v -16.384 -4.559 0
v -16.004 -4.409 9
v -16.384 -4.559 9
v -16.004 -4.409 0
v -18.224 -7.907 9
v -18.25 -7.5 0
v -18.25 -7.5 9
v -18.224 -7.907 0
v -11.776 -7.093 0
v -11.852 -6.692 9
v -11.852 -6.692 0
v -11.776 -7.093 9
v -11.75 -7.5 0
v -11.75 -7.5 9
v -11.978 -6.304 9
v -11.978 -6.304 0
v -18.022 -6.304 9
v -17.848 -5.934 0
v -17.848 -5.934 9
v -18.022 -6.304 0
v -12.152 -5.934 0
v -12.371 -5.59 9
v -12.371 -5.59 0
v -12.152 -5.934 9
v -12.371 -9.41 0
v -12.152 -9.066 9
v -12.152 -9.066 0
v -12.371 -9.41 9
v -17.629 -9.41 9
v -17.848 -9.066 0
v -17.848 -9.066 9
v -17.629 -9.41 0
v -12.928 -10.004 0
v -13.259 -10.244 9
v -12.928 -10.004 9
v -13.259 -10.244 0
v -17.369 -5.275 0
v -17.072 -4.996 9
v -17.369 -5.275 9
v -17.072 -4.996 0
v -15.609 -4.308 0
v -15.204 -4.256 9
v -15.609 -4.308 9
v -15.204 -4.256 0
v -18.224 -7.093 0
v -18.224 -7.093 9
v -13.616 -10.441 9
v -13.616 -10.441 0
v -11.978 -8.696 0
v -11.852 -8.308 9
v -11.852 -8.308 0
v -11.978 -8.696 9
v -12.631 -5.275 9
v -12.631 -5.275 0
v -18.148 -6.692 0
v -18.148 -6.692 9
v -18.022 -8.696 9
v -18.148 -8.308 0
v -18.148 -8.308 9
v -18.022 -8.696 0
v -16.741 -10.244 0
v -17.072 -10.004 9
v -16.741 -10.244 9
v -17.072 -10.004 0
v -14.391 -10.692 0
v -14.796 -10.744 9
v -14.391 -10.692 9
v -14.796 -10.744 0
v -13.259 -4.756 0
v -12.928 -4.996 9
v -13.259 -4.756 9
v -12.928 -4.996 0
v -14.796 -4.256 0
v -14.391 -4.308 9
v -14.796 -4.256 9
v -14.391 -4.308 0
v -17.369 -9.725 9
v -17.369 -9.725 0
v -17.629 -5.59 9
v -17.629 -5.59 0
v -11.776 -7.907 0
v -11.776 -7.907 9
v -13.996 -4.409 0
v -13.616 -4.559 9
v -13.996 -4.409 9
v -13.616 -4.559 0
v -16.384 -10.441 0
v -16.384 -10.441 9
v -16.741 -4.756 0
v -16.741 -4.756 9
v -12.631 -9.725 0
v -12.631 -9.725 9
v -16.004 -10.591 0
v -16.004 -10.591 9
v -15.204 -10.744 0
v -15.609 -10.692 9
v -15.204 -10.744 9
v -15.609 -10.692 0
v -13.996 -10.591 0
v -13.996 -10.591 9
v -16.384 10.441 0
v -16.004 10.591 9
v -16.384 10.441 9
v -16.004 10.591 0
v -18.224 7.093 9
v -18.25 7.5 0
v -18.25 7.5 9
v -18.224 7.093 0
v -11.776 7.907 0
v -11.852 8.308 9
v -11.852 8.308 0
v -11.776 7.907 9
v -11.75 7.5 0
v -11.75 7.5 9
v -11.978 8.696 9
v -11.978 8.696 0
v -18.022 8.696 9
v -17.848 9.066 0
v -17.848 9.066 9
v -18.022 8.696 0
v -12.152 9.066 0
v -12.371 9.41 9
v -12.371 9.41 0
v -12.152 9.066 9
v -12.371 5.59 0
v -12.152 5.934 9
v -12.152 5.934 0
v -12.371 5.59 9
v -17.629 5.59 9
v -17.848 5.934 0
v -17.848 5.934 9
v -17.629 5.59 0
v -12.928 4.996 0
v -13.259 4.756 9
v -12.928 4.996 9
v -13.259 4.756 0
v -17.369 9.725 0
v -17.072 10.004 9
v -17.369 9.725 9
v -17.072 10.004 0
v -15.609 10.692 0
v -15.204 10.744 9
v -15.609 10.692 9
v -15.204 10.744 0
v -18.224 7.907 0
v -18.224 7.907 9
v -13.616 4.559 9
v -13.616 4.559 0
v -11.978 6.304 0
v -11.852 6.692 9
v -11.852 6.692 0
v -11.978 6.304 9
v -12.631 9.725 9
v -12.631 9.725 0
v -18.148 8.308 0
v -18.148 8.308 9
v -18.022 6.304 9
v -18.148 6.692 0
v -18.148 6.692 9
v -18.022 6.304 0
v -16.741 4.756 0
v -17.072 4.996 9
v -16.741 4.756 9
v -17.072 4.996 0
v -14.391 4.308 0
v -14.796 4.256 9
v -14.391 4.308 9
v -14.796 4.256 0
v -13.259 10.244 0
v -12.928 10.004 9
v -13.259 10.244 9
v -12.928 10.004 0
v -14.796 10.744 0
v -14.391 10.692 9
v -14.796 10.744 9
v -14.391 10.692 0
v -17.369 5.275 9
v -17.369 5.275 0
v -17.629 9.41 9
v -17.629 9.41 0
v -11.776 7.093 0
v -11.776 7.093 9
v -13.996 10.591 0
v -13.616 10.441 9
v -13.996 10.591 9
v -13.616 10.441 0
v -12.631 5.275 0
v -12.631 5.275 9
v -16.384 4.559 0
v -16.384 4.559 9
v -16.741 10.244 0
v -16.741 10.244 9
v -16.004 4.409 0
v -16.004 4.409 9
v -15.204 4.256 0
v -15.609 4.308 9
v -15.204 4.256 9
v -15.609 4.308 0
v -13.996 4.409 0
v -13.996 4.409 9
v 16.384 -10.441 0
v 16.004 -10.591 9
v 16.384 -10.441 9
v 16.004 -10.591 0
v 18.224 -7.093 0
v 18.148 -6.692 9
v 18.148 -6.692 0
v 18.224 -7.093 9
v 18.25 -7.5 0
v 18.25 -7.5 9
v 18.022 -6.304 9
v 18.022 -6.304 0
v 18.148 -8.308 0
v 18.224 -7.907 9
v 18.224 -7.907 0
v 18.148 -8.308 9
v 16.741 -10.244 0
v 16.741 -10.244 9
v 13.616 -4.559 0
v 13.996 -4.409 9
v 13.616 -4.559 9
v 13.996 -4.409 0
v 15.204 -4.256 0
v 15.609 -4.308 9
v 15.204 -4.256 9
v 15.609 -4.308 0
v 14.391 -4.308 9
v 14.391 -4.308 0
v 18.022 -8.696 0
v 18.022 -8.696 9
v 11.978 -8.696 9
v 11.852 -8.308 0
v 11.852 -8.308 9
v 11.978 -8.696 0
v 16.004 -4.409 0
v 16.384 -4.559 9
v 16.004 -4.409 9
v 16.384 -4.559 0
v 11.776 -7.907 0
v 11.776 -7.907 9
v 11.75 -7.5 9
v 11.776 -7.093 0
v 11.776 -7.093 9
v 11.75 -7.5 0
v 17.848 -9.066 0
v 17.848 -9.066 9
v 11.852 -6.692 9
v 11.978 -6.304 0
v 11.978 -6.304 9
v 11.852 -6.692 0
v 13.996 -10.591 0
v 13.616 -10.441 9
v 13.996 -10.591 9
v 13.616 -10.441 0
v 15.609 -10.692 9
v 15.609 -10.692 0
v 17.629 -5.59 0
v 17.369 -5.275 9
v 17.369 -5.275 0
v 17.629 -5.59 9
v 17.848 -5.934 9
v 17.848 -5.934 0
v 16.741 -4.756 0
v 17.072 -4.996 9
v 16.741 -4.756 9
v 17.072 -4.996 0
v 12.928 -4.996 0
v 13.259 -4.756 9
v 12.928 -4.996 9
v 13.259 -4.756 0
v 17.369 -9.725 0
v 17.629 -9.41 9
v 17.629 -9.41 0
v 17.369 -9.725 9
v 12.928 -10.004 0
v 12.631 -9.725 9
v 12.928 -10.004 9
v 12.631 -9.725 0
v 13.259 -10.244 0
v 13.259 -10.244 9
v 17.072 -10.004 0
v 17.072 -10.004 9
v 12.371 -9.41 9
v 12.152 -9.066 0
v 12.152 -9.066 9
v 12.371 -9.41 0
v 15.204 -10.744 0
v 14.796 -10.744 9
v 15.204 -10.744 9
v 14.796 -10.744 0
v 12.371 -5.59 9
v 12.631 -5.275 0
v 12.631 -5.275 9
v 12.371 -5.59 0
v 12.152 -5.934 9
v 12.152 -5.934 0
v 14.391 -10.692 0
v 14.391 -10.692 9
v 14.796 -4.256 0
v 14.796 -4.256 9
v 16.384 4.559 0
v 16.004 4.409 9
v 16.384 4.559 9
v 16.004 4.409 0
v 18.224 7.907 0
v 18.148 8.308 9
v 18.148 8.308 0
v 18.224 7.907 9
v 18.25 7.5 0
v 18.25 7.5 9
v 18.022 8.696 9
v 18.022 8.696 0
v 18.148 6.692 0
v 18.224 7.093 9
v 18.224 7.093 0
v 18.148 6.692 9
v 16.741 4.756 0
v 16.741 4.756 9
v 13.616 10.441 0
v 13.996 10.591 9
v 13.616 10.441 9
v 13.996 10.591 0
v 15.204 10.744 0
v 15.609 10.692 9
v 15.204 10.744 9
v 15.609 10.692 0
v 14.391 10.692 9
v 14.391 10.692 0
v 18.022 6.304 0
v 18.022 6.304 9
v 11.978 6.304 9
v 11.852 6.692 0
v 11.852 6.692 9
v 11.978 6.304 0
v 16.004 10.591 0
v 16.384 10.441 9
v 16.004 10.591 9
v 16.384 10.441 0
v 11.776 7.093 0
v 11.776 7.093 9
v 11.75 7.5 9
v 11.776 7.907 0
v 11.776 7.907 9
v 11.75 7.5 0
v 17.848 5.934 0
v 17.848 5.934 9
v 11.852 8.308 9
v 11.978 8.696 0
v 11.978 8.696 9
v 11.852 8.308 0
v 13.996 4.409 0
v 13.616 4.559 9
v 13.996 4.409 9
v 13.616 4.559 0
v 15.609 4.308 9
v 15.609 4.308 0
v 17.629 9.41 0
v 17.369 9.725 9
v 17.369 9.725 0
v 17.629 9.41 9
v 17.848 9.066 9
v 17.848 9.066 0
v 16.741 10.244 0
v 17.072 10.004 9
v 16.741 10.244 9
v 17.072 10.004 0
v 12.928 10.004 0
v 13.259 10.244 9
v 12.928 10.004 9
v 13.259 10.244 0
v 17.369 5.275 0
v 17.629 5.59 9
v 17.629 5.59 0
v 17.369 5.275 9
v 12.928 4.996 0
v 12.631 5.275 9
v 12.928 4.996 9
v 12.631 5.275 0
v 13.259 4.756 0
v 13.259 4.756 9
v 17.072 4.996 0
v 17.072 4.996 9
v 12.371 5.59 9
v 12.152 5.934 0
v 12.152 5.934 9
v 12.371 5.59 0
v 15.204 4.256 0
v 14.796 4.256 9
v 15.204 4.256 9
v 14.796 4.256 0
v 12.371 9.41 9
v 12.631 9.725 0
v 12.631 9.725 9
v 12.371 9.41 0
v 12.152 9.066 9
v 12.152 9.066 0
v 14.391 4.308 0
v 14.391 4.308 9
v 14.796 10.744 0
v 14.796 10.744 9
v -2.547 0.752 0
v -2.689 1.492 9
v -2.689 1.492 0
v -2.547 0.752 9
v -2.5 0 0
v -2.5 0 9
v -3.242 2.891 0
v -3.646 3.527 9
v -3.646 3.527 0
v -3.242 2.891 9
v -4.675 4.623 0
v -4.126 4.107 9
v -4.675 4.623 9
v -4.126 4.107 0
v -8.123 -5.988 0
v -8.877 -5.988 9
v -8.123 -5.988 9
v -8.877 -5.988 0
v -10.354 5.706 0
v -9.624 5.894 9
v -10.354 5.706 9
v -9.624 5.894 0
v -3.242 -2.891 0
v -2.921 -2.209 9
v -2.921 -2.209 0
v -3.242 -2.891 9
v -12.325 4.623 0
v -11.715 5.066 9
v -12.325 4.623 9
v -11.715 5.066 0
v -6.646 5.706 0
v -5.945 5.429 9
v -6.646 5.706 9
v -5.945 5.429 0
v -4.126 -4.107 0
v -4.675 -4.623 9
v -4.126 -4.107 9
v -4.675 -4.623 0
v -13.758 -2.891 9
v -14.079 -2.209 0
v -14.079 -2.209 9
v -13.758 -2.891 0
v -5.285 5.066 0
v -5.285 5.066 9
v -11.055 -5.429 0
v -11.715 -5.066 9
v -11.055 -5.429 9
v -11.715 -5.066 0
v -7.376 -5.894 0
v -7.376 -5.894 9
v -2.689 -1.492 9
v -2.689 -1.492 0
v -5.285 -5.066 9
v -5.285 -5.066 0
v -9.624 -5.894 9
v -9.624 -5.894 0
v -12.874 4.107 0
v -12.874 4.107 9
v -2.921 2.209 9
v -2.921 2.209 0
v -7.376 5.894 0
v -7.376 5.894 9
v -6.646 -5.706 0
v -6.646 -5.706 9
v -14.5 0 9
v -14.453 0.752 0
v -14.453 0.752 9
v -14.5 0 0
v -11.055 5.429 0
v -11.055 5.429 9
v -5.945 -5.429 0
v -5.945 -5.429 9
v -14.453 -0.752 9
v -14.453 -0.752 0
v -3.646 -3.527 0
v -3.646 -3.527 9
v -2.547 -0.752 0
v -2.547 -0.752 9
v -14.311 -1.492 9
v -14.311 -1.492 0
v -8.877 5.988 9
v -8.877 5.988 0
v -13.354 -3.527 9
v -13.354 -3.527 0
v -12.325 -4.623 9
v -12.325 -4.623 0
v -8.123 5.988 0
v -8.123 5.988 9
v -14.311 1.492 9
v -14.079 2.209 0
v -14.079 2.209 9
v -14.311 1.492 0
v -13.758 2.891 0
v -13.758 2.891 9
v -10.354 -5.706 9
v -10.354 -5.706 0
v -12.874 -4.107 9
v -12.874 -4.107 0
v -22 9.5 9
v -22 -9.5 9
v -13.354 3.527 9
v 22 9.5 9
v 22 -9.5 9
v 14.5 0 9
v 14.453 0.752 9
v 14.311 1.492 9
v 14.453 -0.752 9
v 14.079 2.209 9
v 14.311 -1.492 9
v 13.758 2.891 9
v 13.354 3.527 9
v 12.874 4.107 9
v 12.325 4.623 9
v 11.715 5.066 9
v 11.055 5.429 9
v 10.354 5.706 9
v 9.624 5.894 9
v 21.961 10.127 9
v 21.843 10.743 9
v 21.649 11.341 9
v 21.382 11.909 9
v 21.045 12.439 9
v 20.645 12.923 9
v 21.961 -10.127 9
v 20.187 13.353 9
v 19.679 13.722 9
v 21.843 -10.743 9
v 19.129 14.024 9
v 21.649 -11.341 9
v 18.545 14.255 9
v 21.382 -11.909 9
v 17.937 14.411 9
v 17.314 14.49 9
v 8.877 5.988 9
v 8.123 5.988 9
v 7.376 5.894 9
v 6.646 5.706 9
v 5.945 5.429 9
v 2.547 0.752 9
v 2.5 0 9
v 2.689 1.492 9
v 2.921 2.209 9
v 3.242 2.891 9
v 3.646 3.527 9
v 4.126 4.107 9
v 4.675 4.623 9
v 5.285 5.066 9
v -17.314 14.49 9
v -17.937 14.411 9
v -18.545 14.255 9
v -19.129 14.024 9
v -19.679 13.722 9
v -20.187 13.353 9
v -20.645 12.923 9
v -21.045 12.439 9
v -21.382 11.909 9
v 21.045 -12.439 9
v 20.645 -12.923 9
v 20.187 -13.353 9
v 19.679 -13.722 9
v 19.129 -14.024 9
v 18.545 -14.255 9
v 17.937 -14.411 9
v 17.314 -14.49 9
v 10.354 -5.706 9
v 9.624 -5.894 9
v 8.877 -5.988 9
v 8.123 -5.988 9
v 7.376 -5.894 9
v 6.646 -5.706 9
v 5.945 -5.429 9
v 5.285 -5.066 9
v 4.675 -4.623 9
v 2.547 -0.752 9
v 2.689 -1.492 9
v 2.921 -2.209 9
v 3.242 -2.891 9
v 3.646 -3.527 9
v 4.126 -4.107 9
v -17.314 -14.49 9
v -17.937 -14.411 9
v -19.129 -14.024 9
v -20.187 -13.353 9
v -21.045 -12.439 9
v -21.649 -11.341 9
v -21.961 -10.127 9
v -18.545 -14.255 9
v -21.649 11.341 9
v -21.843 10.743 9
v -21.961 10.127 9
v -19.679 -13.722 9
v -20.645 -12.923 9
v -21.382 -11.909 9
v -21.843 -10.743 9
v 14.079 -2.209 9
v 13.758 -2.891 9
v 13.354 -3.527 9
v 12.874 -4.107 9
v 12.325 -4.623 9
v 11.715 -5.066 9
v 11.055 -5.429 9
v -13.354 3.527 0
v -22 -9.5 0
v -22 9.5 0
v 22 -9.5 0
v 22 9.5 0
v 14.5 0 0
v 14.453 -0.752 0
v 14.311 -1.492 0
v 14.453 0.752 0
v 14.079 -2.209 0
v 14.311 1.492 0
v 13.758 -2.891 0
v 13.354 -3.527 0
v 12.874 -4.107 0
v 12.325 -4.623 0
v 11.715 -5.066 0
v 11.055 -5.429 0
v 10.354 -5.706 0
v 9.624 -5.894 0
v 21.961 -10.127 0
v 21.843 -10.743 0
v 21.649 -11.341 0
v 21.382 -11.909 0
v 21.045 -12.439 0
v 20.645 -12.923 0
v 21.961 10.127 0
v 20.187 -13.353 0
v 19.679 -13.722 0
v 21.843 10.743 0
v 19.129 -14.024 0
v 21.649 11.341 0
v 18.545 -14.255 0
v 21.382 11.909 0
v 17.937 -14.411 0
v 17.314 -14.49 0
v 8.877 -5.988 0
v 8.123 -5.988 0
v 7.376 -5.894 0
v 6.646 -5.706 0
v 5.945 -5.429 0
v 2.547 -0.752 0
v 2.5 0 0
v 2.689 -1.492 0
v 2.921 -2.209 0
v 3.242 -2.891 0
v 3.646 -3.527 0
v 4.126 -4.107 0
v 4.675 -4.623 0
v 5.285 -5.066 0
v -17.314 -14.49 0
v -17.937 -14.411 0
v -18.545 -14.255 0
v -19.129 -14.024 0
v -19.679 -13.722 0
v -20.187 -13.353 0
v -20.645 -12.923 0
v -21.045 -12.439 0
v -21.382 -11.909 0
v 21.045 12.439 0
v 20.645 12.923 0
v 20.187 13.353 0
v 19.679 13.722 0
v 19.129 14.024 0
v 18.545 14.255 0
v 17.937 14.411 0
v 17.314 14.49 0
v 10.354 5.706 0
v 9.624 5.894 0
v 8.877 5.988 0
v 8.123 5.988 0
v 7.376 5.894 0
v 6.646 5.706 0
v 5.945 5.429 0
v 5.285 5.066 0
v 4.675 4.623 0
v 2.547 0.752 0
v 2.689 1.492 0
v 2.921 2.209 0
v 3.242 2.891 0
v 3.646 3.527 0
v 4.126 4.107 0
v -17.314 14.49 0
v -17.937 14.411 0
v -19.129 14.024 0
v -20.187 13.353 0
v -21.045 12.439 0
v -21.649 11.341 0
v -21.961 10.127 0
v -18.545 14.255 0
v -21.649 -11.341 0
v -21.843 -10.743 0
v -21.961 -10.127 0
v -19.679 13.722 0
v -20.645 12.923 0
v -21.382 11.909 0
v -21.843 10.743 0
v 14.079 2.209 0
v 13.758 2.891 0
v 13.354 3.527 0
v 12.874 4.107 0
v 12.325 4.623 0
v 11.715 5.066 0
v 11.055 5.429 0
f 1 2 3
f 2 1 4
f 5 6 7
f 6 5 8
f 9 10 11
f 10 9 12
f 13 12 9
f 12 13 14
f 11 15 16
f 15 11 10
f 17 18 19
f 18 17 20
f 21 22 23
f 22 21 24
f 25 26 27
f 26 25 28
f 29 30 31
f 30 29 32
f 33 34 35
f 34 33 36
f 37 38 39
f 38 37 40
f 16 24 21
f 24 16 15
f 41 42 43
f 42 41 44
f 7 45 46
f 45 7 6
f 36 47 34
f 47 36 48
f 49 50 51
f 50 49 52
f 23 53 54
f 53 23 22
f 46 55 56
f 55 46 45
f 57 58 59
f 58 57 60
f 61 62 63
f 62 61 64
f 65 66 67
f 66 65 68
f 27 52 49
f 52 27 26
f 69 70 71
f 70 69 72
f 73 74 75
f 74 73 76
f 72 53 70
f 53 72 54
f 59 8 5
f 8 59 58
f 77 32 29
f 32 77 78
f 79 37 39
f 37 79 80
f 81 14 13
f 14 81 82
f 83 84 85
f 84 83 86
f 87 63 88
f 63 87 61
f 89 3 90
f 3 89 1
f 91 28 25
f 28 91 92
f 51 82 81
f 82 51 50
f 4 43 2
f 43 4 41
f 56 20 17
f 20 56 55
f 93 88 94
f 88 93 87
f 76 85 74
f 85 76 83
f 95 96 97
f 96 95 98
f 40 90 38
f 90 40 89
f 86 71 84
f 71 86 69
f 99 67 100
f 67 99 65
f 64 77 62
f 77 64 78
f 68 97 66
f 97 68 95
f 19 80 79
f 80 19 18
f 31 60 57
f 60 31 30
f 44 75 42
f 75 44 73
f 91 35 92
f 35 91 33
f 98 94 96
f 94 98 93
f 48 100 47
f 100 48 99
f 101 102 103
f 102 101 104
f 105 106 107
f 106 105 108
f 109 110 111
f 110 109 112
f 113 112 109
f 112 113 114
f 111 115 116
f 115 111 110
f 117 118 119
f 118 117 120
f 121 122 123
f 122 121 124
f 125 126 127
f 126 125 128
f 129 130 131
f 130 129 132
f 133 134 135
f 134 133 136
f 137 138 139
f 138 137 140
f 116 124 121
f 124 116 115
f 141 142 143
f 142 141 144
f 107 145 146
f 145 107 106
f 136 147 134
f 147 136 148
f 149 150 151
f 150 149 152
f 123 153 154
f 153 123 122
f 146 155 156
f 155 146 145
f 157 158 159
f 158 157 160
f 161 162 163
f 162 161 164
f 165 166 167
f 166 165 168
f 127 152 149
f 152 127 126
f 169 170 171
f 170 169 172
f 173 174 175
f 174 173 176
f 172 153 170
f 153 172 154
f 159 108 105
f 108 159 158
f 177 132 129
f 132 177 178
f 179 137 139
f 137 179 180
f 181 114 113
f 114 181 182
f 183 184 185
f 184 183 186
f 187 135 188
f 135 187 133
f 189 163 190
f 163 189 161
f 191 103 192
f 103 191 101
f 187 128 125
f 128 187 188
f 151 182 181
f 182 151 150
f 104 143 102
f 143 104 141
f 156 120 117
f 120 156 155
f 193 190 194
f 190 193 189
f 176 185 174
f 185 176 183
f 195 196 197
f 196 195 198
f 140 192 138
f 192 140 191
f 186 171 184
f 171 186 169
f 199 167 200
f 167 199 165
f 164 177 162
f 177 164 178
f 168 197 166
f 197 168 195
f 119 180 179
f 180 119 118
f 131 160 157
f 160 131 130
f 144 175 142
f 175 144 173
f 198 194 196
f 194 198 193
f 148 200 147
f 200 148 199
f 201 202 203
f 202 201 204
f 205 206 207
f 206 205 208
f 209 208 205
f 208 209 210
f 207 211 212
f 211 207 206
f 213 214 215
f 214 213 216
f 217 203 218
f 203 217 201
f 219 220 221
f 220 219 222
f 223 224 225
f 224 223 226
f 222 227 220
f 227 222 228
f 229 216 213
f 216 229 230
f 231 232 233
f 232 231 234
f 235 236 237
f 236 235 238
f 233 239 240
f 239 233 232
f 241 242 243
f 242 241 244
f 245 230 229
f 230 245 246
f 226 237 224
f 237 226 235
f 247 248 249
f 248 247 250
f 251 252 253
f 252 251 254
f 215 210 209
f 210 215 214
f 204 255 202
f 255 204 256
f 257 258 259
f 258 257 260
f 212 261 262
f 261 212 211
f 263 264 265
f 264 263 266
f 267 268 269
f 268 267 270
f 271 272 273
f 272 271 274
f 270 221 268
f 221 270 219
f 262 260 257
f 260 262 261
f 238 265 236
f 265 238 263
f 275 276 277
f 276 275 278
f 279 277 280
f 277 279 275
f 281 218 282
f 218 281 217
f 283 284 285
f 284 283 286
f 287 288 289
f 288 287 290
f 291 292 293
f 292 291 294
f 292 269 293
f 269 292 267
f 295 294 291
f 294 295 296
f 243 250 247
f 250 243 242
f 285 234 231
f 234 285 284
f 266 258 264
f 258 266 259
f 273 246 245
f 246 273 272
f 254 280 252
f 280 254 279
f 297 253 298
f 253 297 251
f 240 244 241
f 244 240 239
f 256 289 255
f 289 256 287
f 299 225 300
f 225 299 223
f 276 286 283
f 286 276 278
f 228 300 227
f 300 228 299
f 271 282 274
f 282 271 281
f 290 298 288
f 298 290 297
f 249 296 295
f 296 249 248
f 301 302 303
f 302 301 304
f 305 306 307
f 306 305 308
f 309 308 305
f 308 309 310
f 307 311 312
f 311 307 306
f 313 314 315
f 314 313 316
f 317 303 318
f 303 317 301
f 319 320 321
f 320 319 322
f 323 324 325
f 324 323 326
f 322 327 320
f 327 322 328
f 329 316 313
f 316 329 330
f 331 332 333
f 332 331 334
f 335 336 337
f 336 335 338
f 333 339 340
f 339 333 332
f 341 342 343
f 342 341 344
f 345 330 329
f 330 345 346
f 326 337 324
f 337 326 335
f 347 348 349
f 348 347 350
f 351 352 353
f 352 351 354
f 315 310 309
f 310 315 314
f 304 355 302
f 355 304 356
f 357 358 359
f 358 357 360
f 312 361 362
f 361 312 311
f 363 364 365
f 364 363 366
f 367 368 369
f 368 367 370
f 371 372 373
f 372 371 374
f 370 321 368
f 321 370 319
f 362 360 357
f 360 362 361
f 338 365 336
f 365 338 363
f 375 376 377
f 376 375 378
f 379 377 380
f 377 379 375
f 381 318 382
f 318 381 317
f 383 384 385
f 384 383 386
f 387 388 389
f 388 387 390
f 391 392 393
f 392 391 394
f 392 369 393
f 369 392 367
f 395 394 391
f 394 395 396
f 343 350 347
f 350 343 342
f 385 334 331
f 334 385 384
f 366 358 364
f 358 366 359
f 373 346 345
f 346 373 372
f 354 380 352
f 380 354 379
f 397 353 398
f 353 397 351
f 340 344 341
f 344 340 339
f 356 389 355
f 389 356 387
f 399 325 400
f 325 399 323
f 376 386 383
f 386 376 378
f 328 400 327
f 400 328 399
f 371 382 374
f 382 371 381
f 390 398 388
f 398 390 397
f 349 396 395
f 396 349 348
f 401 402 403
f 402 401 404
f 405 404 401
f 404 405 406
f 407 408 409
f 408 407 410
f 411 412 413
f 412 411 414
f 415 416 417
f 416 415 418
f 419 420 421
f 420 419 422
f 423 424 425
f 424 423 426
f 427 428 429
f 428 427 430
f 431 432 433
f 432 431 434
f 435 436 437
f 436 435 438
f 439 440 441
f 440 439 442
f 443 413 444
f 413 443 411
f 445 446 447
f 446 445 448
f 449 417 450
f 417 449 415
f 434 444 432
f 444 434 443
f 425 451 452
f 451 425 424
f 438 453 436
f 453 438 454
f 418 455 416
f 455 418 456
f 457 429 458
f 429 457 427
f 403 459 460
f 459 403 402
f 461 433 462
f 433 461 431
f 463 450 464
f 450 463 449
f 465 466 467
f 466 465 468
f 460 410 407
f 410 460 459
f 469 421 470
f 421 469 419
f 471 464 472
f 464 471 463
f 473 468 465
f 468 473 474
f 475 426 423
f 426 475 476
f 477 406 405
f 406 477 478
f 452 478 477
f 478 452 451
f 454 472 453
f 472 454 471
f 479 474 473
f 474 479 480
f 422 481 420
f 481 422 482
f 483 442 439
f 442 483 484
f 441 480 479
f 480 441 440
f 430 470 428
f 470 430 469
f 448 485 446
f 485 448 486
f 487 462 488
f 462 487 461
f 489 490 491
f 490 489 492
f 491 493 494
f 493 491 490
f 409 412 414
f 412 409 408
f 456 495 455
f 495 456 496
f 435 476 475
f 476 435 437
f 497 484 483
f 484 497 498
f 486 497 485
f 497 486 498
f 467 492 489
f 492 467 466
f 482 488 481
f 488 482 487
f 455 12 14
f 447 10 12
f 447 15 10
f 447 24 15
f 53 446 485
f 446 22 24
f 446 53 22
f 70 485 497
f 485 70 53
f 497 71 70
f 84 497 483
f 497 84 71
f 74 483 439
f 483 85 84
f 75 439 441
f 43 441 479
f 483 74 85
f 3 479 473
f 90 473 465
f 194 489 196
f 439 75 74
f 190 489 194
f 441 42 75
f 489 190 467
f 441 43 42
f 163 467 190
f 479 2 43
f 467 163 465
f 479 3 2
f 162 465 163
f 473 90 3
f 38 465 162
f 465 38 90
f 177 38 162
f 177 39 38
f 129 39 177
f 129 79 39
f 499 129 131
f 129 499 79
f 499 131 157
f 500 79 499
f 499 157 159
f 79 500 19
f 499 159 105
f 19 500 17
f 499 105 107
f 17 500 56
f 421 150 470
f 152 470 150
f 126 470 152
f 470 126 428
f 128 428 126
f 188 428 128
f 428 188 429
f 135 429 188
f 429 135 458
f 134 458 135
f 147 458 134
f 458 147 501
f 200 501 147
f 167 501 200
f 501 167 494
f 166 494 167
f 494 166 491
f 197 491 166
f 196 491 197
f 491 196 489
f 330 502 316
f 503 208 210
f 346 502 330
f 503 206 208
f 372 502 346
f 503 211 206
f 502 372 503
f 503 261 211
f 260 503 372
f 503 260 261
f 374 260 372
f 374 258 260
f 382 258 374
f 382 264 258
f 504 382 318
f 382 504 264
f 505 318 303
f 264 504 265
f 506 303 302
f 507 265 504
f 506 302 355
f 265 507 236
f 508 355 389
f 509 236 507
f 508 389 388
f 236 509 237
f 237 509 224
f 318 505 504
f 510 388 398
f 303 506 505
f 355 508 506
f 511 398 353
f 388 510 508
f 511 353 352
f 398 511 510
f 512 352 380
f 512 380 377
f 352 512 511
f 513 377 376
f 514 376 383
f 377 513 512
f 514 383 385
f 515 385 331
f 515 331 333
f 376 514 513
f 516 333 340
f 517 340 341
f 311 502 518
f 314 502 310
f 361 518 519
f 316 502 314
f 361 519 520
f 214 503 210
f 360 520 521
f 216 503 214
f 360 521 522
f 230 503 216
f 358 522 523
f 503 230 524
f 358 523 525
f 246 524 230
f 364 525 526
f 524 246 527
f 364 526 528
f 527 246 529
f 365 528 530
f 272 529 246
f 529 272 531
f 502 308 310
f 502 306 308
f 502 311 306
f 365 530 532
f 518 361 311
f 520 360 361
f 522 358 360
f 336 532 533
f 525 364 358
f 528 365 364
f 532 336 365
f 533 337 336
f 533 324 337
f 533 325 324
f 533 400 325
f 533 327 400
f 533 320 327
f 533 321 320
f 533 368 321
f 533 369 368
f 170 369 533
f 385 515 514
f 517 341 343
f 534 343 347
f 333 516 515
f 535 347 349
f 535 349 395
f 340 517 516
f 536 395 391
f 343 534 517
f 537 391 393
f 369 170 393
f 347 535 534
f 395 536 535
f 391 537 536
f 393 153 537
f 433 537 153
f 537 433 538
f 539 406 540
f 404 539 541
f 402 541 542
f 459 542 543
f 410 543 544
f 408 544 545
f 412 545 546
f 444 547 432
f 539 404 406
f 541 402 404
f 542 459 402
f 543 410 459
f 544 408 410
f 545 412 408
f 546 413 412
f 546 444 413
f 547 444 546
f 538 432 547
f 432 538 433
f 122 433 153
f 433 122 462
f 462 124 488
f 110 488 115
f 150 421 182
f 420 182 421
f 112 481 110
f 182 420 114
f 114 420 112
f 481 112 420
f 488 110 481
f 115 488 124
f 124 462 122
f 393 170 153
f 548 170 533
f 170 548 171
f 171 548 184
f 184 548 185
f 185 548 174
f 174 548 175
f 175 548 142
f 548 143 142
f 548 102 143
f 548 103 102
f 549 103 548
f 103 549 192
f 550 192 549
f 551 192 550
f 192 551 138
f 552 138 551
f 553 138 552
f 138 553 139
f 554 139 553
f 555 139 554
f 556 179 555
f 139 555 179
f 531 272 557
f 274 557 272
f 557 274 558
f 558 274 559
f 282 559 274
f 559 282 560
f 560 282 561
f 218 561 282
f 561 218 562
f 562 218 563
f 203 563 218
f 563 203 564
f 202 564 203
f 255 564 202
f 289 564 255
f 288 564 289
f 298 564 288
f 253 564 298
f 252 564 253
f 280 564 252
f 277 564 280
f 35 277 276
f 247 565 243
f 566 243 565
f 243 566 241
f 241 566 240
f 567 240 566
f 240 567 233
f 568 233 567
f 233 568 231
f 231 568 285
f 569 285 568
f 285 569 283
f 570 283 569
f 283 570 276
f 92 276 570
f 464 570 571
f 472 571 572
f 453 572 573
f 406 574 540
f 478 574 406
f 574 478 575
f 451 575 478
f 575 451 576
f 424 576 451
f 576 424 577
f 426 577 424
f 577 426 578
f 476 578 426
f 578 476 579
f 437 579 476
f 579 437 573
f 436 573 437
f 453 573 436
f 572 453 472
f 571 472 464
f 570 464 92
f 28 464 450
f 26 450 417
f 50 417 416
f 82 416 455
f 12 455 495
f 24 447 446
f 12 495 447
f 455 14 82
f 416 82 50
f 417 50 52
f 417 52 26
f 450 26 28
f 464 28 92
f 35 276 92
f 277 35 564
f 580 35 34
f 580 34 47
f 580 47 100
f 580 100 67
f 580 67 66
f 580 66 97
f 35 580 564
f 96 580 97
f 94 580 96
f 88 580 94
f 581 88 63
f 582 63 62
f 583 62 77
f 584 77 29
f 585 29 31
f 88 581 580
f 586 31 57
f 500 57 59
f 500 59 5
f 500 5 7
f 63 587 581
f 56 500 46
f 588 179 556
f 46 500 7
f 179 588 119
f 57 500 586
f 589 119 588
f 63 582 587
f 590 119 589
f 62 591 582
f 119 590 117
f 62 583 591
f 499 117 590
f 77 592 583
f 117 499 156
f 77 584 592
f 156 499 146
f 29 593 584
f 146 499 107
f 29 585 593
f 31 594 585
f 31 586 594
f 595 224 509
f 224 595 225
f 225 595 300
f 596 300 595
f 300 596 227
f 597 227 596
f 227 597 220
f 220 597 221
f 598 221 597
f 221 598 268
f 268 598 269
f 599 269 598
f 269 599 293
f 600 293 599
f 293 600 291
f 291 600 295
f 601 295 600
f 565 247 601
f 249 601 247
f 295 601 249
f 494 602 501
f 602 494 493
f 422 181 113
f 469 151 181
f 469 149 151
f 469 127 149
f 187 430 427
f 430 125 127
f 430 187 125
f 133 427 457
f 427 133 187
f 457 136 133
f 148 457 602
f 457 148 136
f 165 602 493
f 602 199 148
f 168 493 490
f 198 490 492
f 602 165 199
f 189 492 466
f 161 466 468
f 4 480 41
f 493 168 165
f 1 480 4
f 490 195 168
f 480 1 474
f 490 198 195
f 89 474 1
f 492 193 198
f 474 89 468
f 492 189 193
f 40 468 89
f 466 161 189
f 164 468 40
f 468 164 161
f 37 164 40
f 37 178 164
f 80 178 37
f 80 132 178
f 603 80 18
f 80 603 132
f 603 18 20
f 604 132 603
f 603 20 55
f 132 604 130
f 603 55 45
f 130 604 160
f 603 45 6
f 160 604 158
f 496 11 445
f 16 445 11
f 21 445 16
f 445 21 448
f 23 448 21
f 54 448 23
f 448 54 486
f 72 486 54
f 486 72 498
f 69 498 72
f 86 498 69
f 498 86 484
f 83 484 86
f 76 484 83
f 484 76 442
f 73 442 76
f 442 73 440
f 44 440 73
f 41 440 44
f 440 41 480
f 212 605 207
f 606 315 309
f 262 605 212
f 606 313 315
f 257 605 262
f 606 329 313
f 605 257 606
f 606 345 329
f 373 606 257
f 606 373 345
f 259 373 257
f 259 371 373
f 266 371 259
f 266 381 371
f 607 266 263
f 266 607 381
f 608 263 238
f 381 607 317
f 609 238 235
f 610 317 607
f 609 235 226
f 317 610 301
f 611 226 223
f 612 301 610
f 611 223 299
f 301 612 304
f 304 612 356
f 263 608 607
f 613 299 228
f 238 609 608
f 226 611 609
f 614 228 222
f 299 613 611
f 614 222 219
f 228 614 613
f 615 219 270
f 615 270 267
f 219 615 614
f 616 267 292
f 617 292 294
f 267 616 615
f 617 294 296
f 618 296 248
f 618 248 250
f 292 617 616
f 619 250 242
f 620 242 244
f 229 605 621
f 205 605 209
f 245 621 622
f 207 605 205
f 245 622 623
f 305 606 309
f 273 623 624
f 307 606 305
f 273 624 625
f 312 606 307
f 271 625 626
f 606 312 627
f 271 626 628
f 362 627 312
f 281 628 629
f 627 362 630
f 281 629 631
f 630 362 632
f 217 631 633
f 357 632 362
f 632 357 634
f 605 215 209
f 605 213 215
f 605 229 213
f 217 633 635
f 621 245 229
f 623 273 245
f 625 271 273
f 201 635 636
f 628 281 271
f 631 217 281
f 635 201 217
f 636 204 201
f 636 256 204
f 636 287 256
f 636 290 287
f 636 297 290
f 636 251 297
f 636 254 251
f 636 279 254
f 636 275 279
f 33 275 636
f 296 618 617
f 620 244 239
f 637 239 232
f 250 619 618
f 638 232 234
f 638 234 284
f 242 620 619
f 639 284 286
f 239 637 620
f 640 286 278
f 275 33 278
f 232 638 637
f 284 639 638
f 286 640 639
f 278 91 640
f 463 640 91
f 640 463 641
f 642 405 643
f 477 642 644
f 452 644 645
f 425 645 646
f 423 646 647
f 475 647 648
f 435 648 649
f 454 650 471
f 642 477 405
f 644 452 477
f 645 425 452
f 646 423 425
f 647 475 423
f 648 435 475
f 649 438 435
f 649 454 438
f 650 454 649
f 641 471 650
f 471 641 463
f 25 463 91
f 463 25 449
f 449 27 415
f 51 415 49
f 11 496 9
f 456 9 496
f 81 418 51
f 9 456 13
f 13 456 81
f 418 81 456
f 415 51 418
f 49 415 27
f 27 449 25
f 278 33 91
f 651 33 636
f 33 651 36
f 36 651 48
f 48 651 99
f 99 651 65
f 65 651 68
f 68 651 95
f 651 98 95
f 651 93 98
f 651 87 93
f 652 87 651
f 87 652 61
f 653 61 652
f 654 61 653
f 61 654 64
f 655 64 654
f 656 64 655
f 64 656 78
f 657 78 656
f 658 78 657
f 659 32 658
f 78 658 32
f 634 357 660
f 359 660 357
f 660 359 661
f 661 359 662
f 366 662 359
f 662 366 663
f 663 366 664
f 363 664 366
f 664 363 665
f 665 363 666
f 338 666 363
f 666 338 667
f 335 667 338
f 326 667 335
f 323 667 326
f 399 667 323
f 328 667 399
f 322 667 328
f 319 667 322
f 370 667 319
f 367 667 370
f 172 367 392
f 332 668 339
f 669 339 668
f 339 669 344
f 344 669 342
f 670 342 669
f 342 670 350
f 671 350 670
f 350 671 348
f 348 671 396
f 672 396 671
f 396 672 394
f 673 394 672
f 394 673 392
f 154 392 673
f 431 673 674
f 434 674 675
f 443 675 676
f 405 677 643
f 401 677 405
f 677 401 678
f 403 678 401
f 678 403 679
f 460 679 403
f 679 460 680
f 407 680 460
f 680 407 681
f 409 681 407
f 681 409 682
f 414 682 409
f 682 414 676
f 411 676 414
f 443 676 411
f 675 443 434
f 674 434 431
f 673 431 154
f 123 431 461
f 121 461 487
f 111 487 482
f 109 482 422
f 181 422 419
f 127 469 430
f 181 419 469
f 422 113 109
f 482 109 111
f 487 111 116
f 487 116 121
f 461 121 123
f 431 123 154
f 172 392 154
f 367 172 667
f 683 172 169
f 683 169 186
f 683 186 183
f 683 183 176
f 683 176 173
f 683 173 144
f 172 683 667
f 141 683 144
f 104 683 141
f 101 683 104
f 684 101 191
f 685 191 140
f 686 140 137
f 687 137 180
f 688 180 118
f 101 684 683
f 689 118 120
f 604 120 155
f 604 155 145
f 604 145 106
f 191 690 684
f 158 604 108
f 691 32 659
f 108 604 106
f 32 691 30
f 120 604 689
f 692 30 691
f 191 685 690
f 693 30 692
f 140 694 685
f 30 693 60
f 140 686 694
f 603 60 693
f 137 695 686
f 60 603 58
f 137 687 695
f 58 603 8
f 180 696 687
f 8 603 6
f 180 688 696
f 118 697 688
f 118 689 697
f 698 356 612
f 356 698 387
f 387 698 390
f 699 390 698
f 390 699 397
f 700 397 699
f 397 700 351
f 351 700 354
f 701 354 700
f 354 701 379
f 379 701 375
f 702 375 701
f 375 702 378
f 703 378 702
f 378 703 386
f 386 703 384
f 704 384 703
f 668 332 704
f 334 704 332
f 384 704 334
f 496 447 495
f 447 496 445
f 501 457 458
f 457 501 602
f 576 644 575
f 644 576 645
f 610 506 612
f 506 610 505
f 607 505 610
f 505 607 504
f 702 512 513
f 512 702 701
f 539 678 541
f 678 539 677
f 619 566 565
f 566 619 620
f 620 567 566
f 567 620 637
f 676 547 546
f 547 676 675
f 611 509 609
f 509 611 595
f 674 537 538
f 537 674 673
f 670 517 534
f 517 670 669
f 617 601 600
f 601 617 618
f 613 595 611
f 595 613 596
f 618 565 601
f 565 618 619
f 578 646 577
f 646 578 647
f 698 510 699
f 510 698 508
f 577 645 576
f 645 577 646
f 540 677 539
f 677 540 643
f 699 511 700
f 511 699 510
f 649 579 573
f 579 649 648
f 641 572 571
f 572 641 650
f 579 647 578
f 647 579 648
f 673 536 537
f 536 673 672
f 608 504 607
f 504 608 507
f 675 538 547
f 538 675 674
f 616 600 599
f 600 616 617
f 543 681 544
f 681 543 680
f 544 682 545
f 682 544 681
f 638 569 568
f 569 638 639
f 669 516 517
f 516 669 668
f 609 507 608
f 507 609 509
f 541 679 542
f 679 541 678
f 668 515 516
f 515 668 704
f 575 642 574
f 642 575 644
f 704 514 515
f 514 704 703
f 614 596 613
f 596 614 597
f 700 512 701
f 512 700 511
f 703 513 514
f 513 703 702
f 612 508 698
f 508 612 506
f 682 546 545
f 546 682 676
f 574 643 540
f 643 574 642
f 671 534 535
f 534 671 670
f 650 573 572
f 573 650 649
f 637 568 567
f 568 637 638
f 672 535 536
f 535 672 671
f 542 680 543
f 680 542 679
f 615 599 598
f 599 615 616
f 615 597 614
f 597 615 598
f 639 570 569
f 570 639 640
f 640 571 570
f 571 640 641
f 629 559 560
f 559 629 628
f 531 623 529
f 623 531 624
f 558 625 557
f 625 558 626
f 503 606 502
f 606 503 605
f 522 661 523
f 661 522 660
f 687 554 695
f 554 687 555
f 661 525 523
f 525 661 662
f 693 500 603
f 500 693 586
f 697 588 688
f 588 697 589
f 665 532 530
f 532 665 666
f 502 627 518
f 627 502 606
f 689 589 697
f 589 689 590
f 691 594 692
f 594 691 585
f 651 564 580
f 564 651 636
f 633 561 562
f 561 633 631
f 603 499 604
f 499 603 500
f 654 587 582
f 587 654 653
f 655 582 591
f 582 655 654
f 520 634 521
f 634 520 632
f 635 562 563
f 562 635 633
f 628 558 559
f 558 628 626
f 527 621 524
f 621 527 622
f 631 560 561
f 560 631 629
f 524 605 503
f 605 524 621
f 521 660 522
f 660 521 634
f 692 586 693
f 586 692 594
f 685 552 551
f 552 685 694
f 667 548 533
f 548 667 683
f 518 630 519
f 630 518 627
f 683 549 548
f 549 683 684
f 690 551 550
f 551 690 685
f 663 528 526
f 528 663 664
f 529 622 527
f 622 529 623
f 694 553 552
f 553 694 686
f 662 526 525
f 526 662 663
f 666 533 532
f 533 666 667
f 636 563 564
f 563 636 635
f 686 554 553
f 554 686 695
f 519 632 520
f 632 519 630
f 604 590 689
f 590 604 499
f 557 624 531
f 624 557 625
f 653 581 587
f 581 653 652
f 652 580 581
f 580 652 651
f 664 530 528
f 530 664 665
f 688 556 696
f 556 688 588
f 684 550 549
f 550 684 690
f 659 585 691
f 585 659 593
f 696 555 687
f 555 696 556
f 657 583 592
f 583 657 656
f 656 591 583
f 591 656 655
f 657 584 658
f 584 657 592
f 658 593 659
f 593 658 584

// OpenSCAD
$fn = 50;

difference() {
	union() {
		hull() {
			translate(v = [-17.0, 9.5, 0]) {
				cylinder(h = 9, r = 5);
			}
			translate(v = [17.0, 9.5, 0]) {
				cylinder(h = 9, r = 5);
			}
			translate(v = [-17.0, -9.5, 0]) {
				cylinder(h = 9, r = 5);
			}
			translate(v = [17.0, -9.5, 0]) {
				cylinder(h = 9, r = 5);
			}
		}
	}
	union() {
		translate(v = [-15.0, -7.5, -100.0]) {
			cylinder(h = 200, r = 3.25);
		}
		translate(v = [-15.0, 7.5, -100.0]) {
			cylinder(h = 200, r = 3.25);
		}
		translate(v = [15.0, -7.5, -100.0]) {
			cylinder(h = 200, r = 3.25);
		}
		translate(v = [15.0, 7.5, -100.0]) {
			cylinder(h = 200, r = 3.25);
		}
		translate(v = [-15.0, -7.5, -100.0]) {
			cylinder(h = 200, r = 1.8);
		}
		translate(v = [-15.0, 7.5, -100.0]) {
			cylinder(h = 200, r = 1.8);
		}
		translate(v = [15.0, -7.5, -100.0]) {
			cylinder(h = 200, r = 1.8);
		}
		translate(v = [15.0, 7.5, -100.0]) {
			cylinder(h = 200, r = 1.8);
		}
		translate(v = [-8.5, 0, 0.0]) {
			cylinder(h = 9, r = 6.0);
		}
		translate(v = [8.5, 0, 0.0]) {
			cylinder(h = 9, r = 6.0);
		}
	}
}
